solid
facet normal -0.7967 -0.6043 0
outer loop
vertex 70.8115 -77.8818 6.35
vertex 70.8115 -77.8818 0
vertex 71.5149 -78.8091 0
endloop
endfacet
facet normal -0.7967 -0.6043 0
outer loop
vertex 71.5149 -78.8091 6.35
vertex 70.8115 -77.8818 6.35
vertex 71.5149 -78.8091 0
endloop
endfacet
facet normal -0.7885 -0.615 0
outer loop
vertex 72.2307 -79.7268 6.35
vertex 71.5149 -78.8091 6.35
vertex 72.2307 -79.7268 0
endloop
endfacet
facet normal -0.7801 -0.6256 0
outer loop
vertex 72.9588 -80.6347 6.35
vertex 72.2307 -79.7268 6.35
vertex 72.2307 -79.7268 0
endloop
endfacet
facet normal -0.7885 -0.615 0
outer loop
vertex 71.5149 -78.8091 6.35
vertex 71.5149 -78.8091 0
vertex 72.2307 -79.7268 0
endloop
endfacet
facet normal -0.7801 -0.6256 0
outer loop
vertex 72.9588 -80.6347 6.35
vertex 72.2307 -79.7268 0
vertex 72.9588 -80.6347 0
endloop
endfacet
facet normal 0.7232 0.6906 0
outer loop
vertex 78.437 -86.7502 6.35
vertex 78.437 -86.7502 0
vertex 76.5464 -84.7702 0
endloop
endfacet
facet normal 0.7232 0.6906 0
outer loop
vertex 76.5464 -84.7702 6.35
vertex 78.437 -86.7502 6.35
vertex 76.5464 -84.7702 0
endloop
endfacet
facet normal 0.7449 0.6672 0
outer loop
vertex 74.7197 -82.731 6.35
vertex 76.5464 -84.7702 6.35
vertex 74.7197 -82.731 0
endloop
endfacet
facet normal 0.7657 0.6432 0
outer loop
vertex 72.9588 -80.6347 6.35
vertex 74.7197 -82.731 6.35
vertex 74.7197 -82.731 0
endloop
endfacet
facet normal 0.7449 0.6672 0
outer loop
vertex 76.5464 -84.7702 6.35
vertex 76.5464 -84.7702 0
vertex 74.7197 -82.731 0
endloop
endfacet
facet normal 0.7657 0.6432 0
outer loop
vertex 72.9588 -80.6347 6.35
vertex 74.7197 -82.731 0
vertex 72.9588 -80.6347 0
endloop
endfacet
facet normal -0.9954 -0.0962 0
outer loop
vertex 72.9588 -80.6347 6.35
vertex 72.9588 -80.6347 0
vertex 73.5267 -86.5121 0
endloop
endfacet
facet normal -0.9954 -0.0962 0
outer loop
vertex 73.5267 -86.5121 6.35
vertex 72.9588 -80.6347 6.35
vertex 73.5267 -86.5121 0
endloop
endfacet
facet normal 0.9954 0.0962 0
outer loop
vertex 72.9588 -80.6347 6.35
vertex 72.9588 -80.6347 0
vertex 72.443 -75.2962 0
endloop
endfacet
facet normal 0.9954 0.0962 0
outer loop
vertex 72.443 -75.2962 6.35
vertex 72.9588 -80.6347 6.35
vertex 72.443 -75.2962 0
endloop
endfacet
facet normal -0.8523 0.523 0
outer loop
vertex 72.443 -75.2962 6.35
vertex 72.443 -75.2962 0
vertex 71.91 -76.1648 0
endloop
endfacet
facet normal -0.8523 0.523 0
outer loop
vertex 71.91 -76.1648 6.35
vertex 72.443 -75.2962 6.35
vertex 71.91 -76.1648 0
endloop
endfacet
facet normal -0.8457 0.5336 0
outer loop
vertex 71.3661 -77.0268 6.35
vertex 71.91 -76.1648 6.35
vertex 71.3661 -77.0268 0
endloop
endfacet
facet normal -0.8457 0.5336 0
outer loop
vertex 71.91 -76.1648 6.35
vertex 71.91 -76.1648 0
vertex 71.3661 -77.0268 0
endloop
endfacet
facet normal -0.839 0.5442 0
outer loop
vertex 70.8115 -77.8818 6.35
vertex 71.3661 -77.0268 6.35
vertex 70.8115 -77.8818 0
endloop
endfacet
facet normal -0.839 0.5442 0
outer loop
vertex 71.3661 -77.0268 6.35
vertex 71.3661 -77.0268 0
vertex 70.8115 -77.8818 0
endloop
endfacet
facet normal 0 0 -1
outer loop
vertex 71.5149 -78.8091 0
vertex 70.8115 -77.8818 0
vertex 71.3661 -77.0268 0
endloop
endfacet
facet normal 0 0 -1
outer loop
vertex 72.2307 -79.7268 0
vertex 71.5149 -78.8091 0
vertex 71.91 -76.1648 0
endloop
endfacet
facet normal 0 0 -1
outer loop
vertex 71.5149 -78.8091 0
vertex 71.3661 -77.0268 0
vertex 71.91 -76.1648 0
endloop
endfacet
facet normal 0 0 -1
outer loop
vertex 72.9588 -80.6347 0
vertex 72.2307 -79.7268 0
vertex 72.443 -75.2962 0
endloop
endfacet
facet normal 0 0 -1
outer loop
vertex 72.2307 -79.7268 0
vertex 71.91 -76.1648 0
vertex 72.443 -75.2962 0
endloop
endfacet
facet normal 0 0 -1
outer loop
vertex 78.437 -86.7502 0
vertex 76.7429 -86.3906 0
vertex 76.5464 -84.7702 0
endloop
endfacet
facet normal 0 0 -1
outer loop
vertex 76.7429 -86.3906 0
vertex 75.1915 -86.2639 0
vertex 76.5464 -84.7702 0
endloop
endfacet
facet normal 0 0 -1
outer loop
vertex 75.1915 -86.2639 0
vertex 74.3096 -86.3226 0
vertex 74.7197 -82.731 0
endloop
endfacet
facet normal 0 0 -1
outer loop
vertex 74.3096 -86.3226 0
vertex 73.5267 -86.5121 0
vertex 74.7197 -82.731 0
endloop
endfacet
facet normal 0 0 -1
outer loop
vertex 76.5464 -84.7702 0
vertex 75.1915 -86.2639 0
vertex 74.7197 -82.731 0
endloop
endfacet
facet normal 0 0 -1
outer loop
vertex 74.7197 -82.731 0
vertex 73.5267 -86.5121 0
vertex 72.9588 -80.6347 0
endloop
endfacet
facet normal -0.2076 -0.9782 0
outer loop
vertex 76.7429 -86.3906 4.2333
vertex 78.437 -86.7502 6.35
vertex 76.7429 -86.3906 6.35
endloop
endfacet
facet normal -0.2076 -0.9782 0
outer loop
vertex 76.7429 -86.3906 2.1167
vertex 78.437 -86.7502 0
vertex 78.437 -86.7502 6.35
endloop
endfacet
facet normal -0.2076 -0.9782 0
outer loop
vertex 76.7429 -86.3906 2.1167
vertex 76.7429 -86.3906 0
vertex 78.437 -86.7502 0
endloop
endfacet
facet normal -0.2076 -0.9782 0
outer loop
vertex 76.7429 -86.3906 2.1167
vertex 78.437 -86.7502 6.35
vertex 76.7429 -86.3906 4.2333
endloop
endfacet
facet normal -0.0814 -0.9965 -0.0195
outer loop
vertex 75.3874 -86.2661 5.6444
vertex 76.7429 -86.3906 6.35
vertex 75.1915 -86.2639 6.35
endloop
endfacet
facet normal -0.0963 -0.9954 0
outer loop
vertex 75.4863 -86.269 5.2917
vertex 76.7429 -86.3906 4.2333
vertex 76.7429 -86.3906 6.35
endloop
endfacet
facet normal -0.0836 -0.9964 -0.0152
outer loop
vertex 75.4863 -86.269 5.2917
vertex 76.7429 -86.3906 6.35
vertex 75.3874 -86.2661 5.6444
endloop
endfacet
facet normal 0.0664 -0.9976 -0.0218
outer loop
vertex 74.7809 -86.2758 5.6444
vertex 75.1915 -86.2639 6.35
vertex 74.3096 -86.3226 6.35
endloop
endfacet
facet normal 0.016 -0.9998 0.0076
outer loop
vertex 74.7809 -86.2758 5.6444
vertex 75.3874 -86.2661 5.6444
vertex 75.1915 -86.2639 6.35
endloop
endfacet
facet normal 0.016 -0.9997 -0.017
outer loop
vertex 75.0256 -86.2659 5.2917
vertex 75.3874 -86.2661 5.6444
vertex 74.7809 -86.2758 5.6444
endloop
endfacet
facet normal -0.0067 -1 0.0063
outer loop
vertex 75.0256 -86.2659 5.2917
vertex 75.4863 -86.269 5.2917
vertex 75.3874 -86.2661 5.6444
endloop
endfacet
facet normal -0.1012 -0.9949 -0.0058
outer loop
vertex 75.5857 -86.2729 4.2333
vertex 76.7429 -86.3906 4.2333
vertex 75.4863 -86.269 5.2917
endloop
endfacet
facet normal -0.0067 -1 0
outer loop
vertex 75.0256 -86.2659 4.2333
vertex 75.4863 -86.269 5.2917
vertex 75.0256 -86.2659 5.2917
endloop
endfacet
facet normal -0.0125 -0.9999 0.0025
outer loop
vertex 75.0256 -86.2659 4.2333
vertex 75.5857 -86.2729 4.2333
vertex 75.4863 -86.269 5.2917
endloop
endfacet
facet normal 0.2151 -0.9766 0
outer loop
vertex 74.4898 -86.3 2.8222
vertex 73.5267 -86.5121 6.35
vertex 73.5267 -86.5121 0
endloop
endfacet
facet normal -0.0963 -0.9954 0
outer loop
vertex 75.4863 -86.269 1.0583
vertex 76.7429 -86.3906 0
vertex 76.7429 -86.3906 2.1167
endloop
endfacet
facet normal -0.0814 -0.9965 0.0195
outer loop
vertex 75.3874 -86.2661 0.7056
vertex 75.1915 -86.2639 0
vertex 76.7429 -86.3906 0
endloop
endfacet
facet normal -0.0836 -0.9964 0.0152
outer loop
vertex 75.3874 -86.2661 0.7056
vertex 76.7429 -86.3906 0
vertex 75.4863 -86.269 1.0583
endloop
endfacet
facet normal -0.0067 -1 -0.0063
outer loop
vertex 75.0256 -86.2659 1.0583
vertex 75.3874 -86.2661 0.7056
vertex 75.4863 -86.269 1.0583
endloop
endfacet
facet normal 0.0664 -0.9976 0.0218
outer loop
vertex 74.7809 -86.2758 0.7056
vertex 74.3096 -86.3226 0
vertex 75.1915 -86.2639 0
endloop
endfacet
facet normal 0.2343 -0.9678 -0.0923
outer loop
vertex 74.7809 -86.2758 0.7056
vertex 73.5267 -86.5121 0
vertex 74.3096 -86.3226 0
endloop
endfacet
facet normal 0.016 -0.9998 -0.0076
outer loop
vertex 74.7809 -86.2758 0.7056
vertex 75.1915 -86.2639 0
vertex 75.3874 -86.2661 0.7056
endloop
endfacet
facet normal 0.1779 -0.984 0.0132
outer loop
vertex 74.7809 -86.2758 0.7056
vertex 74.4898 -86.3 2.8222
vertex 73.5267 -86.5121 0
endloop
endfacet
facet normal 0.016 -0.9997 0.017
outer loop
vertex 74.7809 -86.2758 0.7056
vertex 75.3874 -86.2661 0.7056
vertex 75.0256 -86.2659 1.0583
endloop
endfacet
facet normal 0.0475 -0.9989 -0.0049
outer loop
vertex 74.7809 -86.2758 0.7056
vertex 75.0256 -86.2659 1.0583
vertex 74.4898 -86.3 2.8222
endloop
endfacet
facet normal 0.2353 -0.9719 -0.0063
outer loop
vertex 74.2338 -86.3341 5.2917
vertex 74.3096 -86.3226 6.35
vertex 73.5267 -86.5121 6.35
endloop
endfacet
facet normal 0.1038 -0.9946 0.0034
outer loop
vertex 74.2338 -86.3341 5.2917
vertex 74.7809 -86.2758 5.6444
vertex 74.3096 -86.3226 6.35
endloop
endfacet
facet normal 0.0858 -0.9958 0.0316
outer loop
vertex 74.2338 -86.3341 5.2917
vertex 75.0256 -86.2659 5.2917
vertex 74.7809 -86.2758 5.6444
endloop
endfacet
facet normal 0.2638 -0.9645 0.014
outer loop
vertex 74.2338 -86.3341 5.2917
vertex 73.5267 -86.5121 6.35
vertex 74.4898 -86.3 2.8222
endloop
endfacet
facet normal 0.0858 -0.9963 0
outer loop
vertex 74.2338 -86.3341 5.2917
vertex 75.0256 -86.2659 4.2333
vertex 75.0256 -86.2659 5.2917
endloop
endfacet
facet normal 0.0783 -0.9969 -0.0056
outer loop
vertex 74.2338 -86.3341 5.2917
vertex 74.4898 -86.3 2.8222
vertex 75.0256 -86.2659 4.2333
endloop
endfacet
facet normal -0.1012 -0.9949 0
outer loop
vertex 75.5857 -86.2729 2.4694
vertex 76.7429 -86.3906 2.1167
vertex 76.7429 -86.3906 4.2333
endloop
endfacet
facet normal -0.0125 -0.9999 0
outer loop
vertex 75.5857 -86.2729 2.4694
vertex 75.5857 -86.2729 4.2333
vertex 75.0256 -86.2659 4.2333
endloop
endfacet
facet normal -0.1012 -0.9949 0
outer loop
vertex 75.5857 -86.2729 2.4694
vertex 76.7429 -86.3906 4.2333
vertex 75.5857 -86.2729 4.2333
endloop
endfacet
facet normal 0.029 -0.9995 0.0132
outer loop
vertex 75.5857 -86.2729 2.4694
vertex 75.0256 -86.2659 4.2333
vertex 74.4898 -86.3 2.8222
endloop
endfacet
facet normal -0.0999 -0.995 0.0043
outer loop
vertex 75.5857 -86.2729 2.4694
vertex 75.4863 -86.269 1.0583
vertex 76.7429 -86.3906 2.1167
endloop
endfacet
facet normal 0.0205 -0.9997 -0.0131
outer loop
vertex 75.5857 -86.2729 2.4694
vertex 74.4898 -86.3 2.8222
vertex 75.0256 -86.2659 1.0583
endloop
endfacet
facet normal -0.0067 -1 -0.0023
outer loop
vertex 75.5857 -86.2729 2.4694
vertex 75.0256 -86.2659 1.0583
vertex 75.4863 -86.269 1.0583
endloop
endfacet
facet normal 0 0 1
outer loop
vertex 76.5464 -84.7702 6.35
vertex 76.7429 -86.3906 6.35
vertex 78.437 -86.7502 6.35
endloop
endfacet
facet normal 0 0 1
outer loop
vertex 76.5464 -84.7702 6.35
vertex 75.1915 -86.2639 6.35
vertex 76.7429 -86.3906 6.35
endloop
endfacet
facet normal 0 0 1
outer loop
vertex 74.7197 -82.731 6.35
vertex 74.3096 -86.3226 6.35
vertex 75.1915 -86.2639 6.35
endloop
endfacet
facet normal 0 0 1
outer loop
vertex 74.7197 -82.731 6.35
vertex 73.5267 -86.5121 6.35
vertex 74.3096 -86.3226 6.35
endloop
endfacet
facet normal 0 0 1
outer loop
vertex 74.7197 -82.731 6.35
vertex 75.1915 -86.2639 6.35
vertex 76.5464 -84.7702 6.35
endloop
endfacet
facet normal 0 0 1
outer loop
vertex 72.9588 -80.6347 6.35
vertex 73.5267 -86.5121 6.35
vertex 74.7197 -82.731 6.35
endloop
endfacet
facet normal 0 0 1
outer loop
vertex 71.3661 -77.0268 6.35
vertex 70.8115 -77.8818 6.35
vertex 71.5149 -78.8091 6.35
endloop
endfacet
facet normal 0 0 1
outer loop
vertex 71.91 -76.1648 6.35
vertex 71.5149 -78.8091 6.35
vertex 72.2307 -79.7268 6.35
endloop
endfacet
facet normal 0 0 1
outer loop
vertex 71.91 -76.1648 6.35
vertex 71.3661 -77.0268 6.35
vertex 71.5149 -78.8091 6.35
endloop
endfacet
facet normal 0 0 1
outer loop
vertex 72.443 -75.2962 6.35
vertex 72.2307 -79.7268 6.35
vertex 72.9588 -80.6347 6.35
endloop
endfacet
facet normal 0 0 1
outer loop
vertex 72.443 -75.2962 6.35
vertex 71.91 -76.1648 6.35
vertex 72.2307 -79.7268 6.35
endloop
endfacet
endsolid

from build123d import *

# Parameters (mm, degrees)
F1_DEPTH = 6.35
F2_DEPTH = 6.35


with BuildPart() as f1:
    # F0 (on Top) → F1 (new body)
    with BuildSketch(Plane.XY):
        with BuildLine():
            ThreePointArc((78.4370391826, -86.7501992629), (75.624927239, -83.7578477701), (72.9588367307, -80.6346919236))
            Line((72.9588367307, -80.6346919236), (73.526725173, -86.5121111274))
            add(Edge.make_bspline(
                [(78.4370391826, -86.7501992629), (76.8349189463, -86.3184887646), (74.8358563915, -86.03503847), (73.526725173, -86.5121111274)],
                knots=[0.7001399432, 0.7001399432, 0.7001399432, 0.7001399432, 0.7108428606, 0.7108428606, 0.7108428606, 0.7108428606], degree=3))
        make_face()
    extrude(amount=F1_DEPTH)


with BuildPart() as f2:
    # F0 (on Top) → F2 (new body)
    with BuildSketch(Plane.XY):
        with BuildLine():
            Line((72.9588367307, -80.6346919236), (72.4430223898, -75.2962189308))
            ThreePointArc((72.4430223898, -75.2962189308), (71.6393776624, -76.5966527102), (70.8115200426, -77.8818081965))
            ThreePointArc((70.8115200426, -77.8818081965), (71.8712093435, -79.2691462556), (72.9588367307, -80.6346919236))
        make_face()
    extrude(amount=F2_DEPTH)


solid = Compound([f1.part, f2.part])
